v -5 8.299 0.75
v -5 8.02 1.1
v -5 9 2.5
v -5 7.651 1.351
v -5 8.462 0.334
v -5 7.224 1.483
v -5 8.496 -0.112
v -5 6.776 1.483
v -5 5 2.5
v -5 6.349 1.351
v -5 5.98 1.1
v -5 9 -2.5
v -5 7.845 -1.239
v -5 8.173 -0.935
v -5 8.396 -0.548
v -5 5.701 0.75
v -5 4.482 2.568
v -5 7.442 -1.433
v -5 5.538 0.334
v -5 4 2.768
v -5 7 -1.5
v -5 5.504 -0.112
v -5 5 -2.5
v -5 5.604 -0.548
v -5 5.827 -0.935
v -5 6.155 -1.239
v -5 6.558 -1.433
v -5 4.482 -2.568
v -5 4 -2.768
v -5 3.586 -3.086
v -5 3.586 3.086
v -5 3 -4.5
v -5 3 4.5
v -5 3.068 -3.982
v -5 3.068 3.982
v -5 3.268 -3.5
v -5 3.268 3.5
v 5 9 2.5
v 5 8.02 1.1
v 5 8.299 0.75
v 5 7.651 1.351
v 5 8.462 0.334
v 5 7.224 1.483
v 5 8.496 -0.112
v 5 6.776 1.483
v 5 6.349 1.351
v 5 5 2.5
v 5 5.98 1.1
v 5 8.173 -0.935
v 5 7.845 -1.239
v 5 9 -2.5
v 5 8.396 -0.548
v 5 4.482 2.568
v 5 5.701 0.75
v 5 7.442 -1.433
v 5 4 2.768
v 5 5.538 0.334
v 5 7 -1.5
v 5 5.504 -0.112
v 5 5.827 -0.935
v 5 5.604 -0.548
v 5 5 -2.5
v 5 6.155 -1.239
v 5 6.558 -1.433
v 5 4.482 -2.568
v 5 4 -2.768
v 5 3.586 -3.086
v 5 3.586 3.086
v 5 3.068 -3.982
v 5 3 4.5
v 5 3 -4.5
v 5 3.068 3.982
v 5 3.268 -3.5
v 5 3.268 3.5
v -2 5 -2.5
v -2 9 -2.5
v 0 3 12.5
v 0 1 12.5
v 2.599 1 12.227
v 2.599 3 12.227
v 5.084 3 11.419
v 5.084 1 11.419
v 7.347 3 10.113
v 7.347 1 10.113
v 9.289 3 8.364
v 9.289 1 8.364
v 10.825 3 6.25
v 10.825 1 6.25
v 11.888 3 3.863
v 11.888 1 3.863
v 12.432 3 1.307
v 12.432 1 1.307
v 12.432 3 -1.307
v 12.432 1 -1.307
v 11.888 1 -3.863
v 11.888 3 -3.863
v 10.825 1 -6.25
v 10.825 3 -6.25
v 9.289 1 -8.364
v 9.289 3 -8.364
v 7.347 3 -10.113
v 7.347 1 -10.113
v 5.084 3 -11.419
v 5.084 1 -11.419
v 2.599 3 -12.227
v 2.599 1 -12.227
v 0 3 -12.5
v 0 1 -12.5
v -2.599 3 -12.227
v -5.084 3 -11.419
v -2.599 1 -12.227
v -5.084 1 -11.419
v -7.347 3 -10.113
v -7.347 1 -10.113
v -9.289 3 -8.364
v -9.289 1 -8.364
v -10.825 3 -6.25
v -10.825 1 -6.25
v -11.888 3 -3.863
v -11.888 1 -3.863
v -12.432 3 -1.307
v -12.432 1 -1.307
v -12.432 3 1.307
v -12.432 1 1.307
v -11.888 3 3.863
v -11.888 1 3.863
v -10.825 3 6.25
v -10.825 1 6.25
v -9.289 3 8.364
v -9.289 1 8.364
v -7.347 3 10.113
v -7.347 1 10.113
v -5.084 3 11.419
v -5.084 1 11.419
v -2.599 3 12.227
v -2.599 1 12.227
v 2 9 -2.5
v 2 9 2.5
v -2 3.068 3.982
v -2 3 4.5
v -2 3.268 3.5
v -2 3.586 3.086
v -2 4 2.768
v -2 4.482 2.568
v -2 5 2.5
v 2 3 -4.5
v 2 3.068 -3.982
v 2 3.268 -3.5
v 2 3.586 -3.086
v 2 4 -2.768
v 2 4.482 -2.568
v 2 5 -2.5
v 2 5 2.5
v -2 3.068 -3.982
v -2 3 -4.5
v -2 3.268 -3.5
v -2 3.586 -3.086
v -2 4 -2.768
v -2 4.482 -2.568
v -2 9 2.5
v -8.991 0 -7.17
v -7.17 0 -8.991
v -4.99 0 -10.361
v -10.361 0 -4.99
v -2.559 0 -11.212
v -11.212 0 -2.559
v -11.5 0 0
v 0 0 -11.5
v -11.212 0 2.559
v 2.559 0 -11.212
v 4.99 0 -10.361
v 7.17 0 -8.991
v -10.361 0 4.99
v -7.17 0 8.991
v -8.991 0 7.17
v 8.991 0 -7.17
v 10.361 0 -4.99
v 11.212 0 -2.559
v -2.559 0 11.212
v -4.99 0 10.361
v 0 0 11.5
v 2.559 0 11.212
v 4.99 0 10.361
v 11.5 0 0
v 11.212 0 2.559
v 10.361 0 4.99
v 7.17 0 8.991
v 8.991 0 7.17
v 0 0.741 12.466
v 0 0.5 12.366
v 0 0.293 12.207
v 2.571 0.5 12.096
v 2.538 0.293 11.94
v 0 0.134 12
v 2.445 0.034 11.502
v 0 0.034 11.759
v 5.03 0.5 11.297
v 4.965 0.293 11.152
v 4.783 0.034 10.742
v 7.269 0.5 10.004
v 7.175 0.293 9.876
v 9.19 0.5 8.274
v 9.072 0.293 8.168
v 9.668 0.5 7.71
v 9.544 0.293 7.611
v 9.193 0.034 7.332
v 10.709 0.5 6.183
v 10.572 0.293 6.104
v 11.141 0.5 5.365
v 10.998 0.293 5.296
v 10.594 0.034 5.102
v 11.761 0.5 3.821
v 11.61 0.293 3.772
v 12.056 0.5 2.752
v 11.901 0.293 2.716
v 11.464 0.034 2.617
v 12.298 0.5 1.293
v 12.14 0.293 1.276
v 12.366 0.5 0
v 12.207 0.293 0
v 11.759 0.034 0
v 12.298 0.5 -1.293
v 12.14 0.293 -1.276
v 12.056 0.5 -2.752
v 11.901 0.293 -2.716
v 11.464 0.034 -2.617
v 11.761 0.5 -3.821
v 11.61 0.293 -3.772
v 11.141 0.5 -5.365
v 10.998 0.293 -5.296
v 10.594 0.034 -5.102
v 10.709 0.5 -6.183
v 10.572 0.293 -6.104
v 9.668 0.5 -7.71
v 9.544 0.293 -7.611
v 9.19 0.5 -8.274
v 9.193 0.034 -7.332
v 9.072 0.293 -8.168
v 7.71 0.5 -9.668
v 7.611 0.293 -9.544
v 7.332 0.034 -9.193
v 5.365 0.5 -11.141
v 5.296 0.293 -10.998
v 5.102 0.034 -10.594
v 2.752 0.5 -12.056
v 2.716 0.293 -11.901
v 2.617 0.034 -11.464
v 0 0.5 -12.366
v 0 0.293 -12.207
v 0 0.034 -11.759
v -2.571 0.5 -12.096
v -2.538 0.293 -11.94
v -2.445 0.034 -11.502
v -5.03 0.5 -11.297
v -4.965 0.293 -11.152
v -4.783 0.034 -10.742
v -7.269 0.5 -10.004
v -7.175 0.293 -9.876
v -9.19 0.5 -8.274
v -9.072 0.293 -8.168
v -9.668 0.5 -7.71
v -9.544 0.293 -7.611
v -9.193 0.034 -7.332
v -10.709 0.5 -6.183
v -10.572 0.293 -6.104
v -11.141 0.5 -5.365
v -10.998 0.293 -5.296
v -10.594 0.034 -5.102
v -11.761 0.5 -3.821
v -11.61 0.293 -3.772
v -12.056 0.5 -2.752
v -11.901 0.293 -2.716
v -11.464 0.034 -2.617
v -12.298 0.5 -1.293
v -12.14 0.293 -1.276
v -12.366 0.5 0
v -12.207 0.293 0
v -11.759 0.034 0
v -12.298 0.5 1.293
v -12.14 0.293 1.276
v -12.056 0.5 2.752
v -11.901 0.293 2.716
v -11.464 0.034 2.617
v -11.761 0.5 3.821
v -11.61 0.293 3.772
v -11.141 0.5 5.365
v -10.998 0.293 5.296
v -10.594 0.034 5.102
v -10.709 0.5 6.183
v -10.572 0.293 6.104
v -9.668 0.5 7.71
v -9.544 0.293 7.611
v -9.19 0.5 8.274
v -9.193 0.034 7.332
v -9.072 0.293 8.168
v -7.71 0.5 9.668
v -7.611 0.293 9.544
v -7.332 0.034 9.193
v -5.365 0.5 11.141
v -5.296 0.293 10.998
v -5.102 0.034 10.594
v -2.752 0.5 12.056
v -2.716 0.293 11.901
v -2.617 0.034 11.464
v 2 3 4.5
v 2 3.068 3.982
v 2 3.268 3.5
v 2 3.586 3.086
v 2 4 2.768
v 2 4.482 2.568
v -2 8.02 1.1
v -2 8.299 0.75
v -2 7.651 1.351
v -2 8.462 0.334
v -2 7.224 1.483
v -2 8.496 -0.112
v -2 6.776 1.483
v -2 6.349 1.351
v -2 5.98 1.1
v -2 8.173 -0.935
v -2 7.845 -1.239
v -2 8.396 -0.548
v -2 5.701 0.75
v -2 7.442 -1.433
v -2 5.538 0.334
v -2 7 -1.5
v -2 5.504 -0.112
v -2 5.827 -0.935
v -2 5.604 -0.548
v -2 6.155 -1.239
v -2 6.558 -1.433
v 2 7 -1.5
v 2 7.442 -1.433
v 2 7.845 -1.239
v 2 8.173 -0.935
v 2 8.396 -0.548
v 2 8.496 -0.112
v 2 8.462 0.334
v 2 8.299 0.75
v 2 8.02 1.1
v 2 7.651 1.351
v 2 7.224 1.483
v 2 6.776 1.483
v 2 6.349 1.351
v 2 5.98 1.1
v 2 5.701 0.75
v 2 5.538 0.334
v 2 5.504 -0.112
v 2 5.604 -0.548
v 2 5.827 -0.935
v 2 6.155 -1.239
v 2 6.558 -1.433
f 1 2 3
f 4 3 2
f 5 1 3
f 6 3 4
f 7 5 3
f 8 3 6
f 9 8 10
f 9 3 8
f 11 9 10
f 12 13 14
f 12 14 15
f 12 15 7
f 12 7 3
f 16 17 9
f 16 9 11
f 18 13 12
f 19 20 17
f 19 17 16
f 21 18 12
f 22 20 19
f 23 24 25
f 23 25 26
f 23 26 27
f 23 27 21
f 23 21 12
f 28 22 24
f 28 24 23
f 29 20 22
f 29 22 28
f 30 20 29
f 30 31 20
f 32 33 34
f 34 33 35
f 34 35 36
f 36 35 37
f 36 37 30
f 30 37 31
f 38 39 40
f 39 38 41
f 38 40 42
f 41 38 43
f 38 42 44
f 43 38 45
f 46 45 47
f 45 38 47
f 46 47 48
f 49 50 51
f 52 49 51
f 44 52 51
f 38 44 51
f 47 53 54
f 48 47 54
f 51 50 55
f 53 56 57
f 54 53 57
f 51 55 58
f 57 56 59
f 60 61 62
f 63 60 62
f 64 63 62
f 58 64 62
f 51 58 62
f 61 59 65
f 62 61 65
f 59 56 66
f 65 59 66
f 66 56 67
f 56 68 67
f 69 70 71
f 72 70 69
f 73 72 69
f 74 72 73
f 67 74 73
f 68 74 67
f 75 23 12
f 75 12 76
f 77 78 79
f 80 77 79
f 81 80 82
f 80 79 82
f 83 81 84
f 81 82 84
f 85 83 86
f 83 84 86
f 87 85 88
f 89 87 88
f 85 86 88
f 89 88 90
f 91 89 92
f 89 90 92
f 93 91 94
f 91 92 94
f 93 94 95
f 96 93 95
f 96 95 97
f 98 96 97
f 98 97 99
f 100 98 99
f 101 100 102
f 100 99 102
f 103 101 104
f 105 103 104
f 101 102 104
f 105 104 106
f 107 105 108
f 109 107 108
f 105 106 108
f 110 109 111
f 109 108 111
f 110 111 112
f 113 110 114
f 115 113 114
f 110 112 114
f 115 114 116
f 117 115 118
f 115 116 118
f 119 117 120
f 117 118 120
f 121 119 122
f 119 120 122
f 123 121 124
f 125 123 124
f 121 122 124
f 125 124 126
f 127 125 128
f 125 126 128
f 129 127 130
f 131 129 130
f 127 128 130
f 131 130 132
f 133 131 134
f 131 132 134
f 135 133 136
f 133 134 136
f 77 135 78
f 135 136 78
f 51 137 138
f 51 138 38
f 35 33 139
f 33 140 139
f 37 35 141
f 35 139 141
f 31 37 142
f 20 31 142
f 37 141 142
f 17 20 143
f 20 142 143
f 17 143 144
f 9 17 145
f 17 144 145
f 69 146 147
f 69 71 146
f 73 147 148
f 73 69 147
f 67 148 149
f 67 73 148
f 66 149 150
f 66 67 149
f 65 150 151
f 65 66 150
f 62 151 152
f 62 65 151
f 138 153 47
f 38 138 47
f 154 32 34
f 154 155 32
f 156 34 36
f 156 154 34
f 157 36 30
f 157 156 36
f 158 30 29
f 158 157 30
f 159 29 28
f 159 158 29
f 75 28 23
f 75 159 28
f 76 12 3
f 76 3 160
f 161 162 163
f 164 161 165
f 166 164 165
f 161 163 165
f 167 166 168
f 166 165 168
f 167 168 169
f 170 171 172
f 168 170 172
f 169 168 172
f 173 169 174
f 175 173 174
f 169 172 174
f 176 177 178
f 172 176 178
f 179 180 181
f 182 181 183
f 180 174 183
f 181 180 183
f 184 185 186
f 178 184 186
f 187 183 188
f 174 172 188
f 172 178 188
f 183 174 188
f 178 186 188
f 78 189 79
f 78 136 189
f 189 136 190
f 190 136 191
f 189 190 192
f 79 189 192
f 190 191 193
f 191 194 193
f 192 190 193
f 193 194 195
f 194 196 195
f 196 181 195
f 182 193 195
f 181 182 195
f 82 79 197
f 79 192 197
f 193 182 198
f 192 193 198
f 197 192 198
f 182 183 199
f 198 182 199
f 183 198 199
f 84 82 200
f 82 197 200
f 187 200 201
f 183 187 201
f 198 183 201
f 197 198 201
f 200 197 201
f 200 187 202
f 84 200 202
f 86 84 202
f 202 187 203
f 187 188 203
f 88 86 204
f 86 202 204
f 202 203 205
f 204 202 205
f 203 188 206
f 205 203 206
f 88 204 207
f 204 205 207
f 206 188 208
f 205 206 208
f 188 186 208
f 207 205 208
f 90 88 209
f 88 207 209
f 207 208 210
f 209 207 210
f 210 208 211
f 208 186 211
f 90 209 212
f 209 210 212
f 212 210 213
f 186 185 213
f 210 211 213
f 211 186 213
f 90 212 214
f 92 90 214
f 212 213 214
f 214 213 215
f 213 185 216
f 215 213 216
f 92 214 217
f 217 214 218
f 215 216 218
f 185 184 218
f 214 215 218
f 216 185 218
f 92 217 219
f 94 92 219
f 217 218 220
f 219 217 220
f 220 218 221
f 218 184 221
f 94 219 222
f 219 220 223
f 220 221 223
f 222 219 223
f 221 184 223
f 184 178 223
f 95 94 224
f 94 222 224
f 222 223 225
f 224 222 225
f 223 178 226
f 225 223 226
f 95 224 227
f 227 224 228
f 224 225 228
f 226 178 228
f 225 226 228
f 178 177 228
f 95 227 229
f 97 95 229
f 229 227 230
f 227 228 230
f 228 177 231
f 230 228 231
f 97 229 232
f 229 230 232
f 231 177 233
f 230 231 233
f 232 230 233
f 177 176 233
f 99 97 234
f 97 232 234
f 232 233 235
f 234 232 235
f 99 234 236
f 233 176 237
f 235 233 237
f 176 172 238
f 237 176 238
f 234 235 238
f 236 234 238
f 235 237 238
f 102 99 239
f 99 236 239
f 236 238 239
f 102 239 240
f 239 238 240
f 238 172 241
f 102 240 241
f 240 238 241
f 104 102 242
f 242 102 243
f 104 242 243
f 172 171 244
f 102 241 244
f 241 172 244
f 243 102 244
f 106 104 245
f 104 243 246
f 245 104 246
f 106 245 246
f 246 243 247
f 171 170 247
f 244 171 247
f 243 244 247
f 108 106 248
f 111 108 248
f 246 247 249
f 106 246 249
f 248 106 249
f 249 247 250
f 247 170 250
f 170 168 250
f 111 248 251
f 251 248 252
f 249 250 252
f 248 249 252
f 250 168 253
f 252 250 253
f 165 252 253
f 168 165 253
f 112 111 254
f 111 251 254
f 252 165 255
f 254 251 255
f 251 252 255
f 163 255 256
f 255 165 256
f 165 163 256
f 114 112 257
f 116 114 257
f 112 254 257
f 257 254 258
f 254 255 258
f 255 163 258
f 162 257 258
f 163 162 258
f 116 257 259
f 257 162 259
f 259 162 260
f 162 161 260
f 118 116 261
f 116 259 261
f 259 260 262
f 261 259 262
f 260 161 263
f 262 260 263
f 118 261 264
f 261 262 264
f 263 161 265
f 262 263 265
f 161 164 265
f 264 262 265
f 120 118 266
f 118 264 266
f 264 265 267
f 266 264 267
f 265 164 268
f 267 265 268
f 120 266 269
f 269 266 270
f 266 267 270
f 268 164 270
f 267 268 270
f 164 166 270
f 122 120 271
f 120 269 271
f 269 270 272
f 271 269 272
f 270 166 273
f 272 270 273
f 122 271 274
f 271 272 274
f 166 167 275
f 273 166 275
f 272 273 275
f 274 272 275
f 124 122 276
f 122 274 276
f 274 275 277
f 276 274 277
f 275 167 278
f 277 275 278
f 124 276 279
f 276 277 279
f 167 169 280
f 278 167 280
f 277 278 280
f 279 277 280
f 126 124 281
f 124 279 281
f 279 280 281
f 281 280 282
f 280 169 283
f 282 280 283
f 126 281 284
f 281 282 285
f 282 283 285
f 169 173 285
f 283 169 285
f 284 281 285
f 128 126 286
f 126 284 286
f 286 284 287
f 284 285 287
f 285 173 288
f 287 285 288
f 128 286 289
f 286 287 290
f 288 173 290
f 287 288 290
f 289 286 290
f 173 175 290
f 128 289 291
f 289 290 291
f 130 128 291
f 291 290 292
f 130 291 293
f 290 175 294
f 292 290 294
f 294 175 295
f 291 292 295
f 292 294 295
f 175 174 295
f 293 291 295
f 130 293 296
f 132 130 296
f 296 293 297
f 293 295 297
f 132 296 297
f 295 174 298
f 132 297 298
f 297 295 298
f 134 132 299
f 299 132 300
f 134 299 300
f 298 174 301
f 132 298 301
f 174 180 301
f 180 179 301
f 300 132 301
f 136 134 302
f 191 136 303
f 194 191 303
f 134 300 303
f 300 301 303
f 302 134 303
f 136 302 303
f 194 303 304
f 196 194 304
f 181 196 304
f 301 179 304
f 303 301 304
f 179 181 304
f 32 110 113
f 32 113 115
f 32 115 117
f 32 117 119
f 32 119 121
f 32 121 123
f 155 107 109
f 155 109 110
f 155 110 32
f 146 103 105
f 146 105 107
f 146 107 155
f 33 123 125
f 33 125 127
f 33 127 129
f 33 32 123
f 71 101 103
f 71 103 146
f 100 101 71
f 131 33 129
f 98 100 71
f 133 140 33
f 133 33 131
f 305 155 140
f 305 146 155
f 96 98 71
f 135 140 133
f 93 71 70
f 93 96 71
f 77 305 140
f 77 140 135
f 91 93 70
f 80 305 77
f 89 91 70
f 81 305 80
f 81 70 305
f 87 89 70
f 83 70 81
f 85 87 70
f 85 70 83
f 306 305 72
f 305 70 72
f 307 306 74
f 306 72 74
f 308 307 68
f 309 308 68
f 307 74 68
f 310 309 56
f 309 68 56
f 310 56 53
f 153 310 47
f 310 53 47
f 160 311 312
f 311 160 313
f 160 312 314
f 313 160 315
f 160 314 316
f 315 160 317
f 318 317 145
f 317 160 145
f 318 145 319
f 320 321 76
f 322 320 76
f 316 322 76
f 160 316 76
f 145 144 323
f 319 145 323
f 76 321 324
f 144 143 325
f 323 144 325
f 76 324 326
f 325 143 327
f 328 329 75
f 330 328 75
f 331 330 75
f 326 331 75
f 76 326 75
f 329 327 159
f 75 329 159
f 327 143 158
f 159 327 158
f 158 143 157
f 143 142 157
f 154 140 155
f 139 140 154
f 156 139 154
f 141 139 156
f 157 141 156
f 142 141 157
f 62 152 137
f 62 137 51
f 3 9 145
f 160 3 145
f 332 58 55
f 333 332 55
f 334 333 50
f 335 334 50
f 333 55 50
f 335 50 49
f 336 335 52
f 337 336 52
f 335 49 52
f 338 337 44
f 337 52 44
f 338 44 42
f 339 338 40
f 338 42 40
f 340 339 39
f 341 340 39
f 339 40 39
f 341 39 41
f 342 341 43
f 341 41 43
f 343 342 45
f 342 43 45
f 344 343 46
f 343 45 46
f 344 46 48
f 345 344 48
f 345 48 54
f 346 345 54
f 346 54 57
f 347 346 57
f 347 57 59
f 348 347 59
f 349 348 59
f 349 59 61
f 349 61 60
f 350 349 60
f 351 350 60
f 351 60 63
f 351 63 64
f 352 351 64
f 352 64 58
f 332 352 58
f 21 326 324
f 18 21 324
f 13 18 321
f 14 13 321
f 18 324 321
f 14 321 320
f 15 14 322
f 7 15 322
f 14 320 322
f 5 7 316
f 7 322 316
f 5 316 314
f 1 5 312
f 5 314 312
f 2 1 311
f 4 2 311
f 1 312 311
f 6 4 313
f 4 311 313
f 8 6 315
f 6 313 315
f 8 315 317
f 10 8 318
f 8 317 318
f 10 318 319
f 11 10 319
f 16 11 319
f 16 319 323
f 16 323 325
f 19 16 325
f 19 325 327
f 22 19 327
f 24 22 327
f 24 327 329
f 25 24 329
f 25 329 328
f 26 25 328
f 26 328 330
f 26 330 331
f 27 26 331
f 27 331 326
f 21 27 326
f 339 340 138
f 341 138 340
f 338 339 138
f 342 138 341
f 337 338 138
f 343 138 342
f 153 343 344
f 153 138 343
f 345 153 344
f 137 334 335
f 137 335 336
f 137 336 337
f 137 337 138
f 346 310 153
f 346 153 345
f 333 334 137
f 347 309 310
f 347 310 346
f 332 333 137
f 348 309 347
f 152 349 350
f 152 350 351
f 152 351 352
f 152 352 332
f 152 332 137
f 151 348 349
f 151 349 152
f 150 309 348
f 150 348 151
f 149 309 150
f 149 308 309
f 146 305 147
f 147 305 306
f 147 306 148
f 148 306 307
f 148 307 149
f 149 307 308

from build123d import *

# Parameters (mm, degrees)
SKETCH1_R               = 12.5
BOSS_EXTRUDE1_DEPTH     = 3
SKETCH2_W               = 3
SKETCH2_H               = 5
BOSS_EXTRUDE2_DEPTH     = 6
SKETCH3_R               = 1.5
CUT_EXTRUDE1_DEPTH      = 8.5
CUT_EXTRUDE1_DEPTH_BACK = 18.5
FILLET1_R               = 2
FILLET2_R               = 1


with BuildPart() as part:
    # Sketch1 → Boss-Extrude1 (new body)
    with BuildSketch(Plane(origin=(0, 0, 0), x_dir=(1, 0, 0), z_dir=(0, 1, 0))):
        with Locations(Location((0, 0, 0), (0, 0, 270))):  # turned: the seam where the file's is
            Circle(SKETCH1_R)
    extrude(amount=BOSS_EXTRUDE1_DEPTH)

    # Sketch2 → Boss-Extrude2 (add)
    with BuildSketch(Plane(origin=(0, 3, 0), x_dir=(1, 0, 0), z_dir=(0, 1, 0))):
        with Locations((-3.5, 0)):
            Rectangle(SKETCH2_W, SKETCH2_H)
        with Locations((3.5, 0)):
            Rectangle(SKETCH2_W, SKETCH2_H)
    extrude(amount=BOSS_EXTRUDE2_DEPTH)

    # Sketch3 → Cut-Extrude1 (cut, two sides)
    with BuildSketch(Plane(origin=(5, 0, 0), x_dir=(0, 0, -1), z_dir=(1, 0, 0))) as cut_extrude1_sk:
        with Locations((0, 7)):
            Circle(SKETCH3_R)
    extrude(amount=CUT_EXTRUDE1_DEPTH, mode=Mode.SUBTRACT)
    extrude(cut_extrude1_sk.sketch, amount=-CUT_EXTRUDE1_DEPTH_BACK, mode=Mode.SUBTRACT)

    # Fillet1
    fillet1_edges = [part.edges().sort_by_distance(p)[0] for p in [
        (3.5, 3, -2.5),
        (3.5, 3, 2.5),
        (-3.5, 3, -2.5),
        (-3.5, 3, 2.5),
    ]]
    fillet(fillet1_edges, radius=FILLET1_R)

    # Fillet2
    fillet2_edges = [part.edges().sort_by_distance(p)[0] for p in [
        (0, 0, -12.5),
    ]]
    fillet(fillet2_edges, radius=FILLET2_R)


solid = part.part
